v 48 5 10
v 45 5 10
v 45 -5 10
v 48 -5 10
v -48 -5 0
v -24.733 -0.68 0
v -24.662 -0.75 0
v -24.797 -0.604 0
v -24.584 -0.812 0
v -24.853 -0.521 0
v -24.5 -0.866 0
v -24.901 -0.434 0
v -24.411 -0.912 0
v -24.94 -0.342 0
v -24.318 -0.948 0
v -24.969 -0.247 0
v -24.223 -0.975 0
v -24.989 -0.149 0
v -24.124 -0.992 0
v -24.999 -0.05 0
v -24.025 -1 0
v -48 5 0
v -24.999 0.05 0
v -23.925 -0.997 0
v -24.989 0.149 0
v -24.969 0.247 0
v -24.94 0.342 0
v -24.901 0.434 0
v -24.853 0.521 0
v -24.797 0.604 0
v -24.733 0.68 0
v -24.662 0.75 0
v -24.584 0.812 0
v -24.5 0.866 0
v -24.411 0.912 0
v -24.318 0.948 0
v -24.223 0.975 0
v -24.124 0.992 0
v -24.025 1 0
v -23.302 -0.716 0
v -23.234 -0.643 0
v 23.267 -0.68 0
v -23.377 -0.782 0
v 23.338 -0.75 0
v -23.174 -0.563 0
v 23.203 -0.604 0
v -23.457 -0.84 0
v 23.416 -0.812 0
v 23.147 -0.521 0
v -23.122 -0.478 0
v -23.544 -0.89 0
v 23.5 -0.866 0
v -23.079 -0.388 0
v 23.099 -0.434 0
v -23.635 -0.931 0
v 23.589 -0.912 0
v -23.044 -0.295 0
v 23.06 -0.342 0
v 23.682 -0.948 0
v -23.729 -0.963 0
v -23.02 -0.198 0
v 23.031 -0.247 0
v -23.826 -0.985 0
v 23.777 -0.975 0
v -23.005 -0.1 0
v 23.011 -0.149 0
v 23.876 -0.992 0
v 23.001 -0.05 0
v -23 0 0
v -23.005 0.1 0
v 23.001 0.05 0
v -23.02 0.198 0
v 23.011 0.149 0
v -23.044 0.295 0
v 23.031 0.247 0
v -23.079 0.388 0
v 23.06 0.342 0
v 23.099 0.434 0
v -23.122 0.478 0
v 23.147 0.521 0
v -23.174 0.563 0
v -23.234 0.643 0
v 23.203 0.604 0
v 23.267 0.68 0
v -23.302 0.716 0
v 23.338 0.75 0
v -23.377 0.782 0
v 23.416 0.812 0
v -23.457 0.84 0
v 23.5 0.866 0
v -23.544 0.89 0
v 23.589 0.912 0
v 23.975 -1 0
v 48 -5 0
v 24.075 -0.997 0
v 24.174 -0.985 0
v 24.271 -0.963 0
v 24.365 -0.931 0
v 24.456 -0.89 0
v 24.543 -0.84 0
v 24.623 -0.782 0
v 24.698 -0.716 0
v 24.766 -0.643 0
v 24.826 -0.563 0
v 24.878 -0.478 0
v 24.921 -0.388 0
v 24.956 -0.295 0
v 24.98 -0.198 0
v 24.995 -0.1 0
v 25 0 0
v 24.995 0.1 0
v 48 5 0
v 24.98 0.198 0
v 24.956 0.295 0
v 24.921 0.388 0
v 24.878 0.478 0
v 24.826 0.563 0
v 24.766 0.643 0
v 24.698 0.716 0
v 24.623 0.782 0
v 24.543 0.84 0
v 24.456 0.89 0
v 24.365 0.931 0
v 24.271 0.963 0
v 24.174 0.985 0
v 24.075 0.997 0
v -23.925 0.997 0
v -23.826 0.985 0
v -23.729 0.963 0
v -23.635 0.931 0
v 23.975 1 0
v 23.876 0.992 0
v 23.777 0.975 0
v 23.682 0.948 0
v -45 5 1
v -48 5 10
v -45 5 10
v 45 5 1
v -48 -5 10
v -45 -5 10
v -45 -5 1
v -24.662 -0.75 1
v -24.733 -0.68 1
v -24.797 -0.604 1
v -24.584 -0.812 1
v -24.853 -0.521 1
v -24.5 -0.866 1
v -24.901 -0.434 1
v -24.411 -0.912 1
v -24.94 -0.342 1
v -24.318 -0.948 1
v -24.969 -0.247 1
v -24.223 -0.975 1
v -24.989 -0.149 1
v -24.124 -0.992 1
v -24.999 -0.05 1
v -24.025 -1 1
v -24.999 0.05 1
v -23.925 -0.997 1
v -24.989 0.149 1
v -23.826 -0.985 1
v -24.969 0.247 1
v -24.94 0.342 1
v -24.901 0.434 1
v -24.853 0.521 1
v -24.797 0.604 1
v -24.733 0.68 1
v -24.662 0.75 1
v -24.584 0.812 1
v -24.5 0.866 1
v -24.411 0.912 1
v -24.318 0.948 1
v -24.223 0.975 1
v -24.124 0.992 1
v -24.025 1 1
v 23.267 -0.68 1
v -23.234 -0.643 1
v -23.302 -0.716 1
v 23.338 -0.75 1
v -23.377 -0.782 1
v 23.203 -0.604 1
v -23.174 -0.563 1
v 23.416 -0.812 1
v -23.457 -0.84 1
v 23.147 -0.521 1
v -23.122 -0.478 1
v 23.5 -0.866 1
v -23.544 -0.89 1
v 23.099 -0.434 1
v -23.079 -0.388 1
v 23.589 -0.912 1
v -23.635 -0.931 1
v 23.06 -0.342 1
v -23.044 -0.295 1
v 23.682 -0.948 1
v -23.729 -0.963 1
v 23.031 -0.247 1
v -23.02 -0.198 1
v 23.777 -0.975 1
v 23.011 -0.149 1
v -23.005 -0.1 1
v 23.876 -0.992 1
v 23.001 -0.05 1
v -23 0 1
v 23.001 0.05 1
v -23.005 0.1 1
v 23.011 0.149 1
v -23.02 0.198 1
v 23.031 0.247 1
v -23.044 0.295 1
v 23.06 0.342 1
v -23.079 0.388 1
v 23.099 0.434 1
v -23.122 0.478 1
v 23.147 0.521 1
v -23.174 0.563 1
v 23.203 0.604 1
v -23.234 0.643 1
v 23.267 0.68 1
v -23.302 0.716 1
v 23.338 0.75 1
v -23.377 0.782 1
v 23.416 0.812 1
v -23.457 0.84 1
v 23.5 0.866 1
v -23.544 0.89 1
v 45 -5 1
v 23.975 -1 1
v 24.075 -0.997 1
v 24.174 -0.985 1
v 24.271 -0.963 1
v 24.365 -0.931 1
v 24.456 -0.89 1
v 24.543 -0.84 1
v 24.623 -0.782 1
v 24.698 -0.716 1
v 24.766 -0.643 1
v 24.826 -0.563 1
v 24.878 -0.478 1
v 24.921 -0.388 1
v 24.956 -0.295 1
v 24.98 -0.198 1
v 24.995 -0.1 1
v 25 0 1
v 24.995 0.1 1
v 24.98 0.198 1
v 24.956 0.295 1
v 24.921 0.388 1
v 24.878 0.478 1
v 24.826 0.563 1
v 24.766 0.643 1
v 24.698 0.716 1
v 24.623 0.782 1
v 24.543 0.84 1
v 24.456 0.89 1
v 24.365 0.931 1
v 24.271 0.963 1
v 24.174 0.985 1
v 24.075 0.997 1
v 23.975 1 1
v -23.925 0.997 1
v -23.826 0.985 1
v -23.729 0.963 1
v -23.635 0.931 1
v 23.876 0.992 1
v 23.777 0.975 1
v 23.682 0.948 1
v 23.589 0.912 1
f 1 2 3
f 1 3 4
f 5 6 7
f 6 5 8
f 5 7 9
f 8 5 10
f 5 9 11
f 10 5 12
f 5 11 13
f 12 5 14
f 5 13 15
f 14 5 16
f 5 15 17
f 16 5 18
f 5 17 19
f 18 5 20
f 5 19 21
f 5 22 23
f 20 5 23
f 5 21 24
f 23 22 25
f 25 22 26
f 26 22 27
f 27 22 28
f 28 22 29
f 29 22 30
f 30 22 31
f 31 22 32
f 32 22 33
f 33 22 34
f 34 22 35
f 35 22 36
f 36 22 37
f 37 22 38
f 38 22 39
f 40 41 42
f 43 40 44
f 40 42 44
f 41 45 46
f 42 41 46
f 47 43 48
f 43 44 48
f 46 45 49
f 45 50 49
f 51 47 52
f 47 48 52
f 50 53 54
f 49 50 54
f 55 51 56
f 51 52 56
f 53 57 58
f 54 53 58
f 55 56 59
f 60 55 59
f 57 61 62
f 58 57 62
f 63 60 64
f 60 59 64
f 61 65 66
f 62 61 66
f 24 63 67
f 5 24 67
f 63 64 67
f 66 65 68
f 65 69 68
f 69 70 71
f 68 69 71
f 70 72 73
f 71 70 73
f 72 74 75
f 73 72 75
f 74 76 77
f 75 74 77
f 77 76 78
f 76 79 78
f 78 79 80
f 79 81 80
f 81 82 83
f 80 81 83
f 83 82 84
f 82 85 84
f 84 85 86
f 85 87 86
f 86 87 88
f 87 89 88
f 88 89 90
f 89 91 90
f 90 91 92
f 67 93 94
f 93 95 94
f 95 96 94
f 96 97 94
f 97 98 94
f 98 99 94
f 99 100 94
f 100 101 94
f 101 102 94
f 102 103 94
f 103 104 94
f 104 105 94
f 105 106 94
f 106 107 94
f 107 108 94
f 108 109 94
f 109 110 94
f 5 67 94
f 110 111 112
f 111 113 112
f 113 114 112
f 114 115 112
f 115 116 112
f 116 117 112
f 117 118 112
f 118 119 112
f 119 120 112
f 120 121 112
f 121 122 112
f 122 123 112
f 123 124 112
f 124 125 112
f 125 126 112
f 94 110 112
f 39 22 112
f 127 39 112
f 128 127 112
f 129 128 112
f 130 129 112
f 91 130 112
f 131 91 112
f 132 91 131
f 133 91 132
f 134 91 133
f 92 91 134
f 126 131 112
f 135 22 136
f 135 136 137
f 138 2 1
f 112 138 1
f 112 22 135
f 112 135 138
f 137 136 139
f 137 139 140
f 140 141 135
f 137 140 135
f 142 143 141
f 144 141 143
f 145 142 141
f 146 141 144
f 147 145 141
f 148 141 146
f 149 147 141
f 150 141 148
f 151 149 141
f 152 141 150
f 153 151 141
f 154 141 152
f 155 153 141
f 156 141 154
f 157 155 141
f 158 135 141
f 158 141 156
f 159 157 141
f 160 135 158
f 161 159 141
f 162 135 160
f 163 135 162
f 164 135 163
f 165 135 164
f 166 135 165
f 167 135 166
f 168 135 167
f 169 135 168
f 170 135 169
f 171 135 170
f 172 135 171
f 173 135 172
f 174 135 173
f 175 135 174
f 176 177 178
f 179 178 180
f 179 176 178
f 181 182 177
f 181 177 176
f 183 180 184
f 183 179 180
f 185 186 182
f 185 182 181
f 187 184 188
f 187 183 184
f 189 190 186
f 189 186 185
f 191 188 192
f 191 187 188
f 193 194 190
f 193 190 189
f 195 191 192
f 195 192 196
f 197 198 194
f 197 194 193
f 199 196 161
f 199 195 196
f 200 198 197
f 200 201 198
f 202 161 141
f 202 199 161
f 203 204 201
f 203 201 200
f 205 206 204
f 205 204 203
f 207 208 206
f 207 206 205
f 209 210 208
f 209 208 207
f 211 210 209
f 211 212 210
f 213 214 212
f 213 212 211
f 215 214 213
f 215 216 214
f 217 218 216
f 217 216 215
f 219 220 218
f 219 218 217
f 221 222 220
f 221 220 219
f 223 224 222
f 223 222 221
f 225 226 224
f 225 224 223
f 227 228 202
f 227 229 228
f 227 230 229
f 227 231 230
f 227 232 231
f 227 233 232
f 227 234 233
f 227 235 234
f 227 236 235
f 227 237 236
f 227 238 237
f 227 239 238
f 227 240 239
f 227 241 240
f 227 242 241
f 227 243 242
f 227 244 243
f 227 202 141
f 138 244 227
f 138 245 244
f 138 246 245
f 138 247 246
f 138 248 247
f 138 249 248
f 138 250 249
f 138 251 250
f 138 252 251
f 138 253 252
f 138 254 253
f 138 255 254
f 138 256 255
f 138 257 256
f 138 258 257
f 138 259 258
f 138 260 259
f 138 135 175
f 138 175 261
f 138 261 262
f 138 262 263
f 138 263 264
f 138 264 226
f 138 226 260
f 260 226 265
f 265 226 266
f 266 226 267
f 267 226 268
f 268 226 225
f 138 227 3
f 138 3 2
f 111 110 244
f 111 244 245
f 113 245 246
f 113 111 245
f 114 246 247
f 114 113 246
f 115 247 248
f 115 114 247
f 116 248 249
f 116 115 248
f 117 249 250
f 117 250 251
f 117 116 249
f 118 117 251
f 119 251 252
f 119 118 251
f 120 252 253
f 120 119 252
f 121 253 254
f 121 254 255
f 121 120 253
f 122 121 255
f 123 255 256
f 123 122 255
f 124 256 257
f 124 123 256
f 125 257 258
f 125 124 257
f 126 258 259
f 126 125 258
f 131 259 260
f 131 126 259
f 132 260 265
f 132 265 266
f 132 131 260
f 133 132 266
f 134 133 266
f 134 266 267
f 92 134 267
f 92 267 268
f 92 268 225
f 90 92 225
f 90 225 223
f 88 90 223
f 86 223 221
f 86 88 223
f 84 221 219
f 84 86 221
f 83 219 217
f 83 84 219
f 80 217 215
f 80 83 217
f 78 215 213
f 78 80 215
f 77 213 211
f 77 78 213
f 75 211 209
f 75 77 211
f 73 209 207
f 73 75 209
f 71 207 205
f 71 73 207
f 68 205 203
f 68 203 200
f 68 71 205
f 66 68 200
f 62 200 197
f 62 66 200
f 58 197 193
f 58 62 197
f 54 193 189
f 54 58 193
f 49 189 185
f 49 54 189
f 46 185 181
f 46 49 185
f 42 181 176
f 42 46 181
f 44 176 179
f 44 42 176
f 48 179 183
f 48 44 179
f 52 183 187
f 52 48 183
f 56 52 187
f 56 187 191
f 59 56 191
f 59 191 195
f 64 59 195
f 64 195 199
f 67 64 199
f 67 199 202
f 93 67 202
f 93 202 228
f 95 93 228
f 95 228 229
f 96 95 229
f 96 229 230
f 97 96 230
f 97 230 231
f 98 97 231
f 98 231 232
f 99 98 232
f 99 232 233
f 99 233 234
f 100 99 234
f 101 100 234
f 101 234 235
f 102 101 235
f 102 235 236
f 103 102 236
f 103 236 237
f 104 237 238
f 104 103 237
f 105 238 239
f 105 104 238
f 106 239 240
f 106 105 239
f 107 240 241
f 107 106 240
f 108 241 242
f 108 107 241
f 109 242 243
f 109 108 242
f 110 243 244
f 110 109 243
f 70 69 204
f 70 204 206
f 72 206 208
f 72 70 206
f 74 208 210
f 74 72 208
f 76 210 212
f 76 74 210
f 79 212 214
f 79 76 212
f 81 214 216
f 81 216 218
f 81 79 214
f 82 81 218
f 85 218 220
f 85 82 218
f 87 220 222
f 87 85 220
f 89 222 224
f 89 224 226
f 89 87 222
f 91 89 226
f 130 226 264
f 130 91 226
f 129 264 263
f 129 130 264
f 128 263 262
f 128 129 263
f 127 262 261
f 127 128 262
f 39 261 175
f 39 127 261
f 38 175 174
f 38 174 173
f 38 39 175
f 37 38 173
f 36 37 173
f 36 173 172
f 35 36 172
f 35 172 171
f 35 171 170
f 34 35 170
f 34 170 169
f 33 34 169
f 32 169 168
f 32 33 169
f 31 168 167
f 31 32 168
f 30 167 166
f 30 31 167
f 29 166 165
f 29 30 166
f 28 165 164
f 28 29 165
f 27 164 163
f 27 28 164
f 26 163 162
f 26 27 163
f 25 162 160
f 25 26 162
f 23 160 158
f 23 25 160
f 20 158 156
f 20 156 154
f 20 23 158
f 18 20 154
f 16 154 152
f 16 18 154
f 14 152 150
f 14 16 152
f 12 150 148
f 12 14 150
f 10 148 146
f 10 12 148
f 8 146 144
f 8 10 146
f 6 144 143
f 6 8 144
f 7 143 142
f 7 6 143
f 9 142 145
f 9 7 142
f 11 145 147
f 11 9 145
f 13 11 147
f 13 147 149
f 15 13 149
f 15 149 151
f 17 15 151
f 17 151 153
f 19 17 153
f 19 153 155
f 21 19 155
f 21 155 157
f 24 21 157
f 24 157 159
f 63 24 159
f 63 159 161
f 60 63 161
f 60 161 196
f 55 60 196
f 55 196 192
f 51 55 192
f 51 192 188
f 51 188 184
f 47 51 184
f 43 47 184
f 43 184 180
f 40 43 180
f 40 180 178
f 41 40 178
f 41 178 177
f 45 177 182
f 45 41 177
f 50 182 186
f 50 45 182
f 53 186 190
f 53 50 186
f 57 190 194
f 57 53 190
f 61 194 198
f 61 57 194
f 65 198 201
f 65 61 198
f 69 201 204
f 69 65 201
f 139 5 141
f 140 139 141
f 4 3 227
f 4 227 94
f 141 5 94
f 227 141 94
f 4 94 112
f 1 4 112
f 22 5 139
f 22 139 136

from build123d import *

# Parameters (mm, degrees)
SKETCH_W     = 90
SKETCH_H     = 10
SKETCH_R     = 1
PAD_DEPTH    = 1
SKETCH001_W  = 3
SKETCH001_H  = 10
PAD001_DEPTH = 10


with BuildPart() as part:
    # Sketch → Pad (new body)
    with BuildSketch(Plane.XY):
        Rectangle(SKETCH_W, SKETCH_H)
        with Locations((-24, 0)):
            Circle(SKETCH_R, mode=Mode.SUBTRACT)
        with Locations((24, 0)):
            Circle(SKETCH_R, mode=Mode.SUBTRACT)
    extrude(amount=PAD_DEPTH)

    # Sketch001 → Pad001 (join)
    with BuildSketch(Plane.XY):
        with Locations((-46.5, 0)):
            Rectangle(SKETCH001_W, SKETCH001_H)
        with Locations((46.5, 0)):
            Rectangle(SKETCH001_W, SKETCH001_H)
    extrude(amount=PAD001_DEPTH)


solid = part.part
